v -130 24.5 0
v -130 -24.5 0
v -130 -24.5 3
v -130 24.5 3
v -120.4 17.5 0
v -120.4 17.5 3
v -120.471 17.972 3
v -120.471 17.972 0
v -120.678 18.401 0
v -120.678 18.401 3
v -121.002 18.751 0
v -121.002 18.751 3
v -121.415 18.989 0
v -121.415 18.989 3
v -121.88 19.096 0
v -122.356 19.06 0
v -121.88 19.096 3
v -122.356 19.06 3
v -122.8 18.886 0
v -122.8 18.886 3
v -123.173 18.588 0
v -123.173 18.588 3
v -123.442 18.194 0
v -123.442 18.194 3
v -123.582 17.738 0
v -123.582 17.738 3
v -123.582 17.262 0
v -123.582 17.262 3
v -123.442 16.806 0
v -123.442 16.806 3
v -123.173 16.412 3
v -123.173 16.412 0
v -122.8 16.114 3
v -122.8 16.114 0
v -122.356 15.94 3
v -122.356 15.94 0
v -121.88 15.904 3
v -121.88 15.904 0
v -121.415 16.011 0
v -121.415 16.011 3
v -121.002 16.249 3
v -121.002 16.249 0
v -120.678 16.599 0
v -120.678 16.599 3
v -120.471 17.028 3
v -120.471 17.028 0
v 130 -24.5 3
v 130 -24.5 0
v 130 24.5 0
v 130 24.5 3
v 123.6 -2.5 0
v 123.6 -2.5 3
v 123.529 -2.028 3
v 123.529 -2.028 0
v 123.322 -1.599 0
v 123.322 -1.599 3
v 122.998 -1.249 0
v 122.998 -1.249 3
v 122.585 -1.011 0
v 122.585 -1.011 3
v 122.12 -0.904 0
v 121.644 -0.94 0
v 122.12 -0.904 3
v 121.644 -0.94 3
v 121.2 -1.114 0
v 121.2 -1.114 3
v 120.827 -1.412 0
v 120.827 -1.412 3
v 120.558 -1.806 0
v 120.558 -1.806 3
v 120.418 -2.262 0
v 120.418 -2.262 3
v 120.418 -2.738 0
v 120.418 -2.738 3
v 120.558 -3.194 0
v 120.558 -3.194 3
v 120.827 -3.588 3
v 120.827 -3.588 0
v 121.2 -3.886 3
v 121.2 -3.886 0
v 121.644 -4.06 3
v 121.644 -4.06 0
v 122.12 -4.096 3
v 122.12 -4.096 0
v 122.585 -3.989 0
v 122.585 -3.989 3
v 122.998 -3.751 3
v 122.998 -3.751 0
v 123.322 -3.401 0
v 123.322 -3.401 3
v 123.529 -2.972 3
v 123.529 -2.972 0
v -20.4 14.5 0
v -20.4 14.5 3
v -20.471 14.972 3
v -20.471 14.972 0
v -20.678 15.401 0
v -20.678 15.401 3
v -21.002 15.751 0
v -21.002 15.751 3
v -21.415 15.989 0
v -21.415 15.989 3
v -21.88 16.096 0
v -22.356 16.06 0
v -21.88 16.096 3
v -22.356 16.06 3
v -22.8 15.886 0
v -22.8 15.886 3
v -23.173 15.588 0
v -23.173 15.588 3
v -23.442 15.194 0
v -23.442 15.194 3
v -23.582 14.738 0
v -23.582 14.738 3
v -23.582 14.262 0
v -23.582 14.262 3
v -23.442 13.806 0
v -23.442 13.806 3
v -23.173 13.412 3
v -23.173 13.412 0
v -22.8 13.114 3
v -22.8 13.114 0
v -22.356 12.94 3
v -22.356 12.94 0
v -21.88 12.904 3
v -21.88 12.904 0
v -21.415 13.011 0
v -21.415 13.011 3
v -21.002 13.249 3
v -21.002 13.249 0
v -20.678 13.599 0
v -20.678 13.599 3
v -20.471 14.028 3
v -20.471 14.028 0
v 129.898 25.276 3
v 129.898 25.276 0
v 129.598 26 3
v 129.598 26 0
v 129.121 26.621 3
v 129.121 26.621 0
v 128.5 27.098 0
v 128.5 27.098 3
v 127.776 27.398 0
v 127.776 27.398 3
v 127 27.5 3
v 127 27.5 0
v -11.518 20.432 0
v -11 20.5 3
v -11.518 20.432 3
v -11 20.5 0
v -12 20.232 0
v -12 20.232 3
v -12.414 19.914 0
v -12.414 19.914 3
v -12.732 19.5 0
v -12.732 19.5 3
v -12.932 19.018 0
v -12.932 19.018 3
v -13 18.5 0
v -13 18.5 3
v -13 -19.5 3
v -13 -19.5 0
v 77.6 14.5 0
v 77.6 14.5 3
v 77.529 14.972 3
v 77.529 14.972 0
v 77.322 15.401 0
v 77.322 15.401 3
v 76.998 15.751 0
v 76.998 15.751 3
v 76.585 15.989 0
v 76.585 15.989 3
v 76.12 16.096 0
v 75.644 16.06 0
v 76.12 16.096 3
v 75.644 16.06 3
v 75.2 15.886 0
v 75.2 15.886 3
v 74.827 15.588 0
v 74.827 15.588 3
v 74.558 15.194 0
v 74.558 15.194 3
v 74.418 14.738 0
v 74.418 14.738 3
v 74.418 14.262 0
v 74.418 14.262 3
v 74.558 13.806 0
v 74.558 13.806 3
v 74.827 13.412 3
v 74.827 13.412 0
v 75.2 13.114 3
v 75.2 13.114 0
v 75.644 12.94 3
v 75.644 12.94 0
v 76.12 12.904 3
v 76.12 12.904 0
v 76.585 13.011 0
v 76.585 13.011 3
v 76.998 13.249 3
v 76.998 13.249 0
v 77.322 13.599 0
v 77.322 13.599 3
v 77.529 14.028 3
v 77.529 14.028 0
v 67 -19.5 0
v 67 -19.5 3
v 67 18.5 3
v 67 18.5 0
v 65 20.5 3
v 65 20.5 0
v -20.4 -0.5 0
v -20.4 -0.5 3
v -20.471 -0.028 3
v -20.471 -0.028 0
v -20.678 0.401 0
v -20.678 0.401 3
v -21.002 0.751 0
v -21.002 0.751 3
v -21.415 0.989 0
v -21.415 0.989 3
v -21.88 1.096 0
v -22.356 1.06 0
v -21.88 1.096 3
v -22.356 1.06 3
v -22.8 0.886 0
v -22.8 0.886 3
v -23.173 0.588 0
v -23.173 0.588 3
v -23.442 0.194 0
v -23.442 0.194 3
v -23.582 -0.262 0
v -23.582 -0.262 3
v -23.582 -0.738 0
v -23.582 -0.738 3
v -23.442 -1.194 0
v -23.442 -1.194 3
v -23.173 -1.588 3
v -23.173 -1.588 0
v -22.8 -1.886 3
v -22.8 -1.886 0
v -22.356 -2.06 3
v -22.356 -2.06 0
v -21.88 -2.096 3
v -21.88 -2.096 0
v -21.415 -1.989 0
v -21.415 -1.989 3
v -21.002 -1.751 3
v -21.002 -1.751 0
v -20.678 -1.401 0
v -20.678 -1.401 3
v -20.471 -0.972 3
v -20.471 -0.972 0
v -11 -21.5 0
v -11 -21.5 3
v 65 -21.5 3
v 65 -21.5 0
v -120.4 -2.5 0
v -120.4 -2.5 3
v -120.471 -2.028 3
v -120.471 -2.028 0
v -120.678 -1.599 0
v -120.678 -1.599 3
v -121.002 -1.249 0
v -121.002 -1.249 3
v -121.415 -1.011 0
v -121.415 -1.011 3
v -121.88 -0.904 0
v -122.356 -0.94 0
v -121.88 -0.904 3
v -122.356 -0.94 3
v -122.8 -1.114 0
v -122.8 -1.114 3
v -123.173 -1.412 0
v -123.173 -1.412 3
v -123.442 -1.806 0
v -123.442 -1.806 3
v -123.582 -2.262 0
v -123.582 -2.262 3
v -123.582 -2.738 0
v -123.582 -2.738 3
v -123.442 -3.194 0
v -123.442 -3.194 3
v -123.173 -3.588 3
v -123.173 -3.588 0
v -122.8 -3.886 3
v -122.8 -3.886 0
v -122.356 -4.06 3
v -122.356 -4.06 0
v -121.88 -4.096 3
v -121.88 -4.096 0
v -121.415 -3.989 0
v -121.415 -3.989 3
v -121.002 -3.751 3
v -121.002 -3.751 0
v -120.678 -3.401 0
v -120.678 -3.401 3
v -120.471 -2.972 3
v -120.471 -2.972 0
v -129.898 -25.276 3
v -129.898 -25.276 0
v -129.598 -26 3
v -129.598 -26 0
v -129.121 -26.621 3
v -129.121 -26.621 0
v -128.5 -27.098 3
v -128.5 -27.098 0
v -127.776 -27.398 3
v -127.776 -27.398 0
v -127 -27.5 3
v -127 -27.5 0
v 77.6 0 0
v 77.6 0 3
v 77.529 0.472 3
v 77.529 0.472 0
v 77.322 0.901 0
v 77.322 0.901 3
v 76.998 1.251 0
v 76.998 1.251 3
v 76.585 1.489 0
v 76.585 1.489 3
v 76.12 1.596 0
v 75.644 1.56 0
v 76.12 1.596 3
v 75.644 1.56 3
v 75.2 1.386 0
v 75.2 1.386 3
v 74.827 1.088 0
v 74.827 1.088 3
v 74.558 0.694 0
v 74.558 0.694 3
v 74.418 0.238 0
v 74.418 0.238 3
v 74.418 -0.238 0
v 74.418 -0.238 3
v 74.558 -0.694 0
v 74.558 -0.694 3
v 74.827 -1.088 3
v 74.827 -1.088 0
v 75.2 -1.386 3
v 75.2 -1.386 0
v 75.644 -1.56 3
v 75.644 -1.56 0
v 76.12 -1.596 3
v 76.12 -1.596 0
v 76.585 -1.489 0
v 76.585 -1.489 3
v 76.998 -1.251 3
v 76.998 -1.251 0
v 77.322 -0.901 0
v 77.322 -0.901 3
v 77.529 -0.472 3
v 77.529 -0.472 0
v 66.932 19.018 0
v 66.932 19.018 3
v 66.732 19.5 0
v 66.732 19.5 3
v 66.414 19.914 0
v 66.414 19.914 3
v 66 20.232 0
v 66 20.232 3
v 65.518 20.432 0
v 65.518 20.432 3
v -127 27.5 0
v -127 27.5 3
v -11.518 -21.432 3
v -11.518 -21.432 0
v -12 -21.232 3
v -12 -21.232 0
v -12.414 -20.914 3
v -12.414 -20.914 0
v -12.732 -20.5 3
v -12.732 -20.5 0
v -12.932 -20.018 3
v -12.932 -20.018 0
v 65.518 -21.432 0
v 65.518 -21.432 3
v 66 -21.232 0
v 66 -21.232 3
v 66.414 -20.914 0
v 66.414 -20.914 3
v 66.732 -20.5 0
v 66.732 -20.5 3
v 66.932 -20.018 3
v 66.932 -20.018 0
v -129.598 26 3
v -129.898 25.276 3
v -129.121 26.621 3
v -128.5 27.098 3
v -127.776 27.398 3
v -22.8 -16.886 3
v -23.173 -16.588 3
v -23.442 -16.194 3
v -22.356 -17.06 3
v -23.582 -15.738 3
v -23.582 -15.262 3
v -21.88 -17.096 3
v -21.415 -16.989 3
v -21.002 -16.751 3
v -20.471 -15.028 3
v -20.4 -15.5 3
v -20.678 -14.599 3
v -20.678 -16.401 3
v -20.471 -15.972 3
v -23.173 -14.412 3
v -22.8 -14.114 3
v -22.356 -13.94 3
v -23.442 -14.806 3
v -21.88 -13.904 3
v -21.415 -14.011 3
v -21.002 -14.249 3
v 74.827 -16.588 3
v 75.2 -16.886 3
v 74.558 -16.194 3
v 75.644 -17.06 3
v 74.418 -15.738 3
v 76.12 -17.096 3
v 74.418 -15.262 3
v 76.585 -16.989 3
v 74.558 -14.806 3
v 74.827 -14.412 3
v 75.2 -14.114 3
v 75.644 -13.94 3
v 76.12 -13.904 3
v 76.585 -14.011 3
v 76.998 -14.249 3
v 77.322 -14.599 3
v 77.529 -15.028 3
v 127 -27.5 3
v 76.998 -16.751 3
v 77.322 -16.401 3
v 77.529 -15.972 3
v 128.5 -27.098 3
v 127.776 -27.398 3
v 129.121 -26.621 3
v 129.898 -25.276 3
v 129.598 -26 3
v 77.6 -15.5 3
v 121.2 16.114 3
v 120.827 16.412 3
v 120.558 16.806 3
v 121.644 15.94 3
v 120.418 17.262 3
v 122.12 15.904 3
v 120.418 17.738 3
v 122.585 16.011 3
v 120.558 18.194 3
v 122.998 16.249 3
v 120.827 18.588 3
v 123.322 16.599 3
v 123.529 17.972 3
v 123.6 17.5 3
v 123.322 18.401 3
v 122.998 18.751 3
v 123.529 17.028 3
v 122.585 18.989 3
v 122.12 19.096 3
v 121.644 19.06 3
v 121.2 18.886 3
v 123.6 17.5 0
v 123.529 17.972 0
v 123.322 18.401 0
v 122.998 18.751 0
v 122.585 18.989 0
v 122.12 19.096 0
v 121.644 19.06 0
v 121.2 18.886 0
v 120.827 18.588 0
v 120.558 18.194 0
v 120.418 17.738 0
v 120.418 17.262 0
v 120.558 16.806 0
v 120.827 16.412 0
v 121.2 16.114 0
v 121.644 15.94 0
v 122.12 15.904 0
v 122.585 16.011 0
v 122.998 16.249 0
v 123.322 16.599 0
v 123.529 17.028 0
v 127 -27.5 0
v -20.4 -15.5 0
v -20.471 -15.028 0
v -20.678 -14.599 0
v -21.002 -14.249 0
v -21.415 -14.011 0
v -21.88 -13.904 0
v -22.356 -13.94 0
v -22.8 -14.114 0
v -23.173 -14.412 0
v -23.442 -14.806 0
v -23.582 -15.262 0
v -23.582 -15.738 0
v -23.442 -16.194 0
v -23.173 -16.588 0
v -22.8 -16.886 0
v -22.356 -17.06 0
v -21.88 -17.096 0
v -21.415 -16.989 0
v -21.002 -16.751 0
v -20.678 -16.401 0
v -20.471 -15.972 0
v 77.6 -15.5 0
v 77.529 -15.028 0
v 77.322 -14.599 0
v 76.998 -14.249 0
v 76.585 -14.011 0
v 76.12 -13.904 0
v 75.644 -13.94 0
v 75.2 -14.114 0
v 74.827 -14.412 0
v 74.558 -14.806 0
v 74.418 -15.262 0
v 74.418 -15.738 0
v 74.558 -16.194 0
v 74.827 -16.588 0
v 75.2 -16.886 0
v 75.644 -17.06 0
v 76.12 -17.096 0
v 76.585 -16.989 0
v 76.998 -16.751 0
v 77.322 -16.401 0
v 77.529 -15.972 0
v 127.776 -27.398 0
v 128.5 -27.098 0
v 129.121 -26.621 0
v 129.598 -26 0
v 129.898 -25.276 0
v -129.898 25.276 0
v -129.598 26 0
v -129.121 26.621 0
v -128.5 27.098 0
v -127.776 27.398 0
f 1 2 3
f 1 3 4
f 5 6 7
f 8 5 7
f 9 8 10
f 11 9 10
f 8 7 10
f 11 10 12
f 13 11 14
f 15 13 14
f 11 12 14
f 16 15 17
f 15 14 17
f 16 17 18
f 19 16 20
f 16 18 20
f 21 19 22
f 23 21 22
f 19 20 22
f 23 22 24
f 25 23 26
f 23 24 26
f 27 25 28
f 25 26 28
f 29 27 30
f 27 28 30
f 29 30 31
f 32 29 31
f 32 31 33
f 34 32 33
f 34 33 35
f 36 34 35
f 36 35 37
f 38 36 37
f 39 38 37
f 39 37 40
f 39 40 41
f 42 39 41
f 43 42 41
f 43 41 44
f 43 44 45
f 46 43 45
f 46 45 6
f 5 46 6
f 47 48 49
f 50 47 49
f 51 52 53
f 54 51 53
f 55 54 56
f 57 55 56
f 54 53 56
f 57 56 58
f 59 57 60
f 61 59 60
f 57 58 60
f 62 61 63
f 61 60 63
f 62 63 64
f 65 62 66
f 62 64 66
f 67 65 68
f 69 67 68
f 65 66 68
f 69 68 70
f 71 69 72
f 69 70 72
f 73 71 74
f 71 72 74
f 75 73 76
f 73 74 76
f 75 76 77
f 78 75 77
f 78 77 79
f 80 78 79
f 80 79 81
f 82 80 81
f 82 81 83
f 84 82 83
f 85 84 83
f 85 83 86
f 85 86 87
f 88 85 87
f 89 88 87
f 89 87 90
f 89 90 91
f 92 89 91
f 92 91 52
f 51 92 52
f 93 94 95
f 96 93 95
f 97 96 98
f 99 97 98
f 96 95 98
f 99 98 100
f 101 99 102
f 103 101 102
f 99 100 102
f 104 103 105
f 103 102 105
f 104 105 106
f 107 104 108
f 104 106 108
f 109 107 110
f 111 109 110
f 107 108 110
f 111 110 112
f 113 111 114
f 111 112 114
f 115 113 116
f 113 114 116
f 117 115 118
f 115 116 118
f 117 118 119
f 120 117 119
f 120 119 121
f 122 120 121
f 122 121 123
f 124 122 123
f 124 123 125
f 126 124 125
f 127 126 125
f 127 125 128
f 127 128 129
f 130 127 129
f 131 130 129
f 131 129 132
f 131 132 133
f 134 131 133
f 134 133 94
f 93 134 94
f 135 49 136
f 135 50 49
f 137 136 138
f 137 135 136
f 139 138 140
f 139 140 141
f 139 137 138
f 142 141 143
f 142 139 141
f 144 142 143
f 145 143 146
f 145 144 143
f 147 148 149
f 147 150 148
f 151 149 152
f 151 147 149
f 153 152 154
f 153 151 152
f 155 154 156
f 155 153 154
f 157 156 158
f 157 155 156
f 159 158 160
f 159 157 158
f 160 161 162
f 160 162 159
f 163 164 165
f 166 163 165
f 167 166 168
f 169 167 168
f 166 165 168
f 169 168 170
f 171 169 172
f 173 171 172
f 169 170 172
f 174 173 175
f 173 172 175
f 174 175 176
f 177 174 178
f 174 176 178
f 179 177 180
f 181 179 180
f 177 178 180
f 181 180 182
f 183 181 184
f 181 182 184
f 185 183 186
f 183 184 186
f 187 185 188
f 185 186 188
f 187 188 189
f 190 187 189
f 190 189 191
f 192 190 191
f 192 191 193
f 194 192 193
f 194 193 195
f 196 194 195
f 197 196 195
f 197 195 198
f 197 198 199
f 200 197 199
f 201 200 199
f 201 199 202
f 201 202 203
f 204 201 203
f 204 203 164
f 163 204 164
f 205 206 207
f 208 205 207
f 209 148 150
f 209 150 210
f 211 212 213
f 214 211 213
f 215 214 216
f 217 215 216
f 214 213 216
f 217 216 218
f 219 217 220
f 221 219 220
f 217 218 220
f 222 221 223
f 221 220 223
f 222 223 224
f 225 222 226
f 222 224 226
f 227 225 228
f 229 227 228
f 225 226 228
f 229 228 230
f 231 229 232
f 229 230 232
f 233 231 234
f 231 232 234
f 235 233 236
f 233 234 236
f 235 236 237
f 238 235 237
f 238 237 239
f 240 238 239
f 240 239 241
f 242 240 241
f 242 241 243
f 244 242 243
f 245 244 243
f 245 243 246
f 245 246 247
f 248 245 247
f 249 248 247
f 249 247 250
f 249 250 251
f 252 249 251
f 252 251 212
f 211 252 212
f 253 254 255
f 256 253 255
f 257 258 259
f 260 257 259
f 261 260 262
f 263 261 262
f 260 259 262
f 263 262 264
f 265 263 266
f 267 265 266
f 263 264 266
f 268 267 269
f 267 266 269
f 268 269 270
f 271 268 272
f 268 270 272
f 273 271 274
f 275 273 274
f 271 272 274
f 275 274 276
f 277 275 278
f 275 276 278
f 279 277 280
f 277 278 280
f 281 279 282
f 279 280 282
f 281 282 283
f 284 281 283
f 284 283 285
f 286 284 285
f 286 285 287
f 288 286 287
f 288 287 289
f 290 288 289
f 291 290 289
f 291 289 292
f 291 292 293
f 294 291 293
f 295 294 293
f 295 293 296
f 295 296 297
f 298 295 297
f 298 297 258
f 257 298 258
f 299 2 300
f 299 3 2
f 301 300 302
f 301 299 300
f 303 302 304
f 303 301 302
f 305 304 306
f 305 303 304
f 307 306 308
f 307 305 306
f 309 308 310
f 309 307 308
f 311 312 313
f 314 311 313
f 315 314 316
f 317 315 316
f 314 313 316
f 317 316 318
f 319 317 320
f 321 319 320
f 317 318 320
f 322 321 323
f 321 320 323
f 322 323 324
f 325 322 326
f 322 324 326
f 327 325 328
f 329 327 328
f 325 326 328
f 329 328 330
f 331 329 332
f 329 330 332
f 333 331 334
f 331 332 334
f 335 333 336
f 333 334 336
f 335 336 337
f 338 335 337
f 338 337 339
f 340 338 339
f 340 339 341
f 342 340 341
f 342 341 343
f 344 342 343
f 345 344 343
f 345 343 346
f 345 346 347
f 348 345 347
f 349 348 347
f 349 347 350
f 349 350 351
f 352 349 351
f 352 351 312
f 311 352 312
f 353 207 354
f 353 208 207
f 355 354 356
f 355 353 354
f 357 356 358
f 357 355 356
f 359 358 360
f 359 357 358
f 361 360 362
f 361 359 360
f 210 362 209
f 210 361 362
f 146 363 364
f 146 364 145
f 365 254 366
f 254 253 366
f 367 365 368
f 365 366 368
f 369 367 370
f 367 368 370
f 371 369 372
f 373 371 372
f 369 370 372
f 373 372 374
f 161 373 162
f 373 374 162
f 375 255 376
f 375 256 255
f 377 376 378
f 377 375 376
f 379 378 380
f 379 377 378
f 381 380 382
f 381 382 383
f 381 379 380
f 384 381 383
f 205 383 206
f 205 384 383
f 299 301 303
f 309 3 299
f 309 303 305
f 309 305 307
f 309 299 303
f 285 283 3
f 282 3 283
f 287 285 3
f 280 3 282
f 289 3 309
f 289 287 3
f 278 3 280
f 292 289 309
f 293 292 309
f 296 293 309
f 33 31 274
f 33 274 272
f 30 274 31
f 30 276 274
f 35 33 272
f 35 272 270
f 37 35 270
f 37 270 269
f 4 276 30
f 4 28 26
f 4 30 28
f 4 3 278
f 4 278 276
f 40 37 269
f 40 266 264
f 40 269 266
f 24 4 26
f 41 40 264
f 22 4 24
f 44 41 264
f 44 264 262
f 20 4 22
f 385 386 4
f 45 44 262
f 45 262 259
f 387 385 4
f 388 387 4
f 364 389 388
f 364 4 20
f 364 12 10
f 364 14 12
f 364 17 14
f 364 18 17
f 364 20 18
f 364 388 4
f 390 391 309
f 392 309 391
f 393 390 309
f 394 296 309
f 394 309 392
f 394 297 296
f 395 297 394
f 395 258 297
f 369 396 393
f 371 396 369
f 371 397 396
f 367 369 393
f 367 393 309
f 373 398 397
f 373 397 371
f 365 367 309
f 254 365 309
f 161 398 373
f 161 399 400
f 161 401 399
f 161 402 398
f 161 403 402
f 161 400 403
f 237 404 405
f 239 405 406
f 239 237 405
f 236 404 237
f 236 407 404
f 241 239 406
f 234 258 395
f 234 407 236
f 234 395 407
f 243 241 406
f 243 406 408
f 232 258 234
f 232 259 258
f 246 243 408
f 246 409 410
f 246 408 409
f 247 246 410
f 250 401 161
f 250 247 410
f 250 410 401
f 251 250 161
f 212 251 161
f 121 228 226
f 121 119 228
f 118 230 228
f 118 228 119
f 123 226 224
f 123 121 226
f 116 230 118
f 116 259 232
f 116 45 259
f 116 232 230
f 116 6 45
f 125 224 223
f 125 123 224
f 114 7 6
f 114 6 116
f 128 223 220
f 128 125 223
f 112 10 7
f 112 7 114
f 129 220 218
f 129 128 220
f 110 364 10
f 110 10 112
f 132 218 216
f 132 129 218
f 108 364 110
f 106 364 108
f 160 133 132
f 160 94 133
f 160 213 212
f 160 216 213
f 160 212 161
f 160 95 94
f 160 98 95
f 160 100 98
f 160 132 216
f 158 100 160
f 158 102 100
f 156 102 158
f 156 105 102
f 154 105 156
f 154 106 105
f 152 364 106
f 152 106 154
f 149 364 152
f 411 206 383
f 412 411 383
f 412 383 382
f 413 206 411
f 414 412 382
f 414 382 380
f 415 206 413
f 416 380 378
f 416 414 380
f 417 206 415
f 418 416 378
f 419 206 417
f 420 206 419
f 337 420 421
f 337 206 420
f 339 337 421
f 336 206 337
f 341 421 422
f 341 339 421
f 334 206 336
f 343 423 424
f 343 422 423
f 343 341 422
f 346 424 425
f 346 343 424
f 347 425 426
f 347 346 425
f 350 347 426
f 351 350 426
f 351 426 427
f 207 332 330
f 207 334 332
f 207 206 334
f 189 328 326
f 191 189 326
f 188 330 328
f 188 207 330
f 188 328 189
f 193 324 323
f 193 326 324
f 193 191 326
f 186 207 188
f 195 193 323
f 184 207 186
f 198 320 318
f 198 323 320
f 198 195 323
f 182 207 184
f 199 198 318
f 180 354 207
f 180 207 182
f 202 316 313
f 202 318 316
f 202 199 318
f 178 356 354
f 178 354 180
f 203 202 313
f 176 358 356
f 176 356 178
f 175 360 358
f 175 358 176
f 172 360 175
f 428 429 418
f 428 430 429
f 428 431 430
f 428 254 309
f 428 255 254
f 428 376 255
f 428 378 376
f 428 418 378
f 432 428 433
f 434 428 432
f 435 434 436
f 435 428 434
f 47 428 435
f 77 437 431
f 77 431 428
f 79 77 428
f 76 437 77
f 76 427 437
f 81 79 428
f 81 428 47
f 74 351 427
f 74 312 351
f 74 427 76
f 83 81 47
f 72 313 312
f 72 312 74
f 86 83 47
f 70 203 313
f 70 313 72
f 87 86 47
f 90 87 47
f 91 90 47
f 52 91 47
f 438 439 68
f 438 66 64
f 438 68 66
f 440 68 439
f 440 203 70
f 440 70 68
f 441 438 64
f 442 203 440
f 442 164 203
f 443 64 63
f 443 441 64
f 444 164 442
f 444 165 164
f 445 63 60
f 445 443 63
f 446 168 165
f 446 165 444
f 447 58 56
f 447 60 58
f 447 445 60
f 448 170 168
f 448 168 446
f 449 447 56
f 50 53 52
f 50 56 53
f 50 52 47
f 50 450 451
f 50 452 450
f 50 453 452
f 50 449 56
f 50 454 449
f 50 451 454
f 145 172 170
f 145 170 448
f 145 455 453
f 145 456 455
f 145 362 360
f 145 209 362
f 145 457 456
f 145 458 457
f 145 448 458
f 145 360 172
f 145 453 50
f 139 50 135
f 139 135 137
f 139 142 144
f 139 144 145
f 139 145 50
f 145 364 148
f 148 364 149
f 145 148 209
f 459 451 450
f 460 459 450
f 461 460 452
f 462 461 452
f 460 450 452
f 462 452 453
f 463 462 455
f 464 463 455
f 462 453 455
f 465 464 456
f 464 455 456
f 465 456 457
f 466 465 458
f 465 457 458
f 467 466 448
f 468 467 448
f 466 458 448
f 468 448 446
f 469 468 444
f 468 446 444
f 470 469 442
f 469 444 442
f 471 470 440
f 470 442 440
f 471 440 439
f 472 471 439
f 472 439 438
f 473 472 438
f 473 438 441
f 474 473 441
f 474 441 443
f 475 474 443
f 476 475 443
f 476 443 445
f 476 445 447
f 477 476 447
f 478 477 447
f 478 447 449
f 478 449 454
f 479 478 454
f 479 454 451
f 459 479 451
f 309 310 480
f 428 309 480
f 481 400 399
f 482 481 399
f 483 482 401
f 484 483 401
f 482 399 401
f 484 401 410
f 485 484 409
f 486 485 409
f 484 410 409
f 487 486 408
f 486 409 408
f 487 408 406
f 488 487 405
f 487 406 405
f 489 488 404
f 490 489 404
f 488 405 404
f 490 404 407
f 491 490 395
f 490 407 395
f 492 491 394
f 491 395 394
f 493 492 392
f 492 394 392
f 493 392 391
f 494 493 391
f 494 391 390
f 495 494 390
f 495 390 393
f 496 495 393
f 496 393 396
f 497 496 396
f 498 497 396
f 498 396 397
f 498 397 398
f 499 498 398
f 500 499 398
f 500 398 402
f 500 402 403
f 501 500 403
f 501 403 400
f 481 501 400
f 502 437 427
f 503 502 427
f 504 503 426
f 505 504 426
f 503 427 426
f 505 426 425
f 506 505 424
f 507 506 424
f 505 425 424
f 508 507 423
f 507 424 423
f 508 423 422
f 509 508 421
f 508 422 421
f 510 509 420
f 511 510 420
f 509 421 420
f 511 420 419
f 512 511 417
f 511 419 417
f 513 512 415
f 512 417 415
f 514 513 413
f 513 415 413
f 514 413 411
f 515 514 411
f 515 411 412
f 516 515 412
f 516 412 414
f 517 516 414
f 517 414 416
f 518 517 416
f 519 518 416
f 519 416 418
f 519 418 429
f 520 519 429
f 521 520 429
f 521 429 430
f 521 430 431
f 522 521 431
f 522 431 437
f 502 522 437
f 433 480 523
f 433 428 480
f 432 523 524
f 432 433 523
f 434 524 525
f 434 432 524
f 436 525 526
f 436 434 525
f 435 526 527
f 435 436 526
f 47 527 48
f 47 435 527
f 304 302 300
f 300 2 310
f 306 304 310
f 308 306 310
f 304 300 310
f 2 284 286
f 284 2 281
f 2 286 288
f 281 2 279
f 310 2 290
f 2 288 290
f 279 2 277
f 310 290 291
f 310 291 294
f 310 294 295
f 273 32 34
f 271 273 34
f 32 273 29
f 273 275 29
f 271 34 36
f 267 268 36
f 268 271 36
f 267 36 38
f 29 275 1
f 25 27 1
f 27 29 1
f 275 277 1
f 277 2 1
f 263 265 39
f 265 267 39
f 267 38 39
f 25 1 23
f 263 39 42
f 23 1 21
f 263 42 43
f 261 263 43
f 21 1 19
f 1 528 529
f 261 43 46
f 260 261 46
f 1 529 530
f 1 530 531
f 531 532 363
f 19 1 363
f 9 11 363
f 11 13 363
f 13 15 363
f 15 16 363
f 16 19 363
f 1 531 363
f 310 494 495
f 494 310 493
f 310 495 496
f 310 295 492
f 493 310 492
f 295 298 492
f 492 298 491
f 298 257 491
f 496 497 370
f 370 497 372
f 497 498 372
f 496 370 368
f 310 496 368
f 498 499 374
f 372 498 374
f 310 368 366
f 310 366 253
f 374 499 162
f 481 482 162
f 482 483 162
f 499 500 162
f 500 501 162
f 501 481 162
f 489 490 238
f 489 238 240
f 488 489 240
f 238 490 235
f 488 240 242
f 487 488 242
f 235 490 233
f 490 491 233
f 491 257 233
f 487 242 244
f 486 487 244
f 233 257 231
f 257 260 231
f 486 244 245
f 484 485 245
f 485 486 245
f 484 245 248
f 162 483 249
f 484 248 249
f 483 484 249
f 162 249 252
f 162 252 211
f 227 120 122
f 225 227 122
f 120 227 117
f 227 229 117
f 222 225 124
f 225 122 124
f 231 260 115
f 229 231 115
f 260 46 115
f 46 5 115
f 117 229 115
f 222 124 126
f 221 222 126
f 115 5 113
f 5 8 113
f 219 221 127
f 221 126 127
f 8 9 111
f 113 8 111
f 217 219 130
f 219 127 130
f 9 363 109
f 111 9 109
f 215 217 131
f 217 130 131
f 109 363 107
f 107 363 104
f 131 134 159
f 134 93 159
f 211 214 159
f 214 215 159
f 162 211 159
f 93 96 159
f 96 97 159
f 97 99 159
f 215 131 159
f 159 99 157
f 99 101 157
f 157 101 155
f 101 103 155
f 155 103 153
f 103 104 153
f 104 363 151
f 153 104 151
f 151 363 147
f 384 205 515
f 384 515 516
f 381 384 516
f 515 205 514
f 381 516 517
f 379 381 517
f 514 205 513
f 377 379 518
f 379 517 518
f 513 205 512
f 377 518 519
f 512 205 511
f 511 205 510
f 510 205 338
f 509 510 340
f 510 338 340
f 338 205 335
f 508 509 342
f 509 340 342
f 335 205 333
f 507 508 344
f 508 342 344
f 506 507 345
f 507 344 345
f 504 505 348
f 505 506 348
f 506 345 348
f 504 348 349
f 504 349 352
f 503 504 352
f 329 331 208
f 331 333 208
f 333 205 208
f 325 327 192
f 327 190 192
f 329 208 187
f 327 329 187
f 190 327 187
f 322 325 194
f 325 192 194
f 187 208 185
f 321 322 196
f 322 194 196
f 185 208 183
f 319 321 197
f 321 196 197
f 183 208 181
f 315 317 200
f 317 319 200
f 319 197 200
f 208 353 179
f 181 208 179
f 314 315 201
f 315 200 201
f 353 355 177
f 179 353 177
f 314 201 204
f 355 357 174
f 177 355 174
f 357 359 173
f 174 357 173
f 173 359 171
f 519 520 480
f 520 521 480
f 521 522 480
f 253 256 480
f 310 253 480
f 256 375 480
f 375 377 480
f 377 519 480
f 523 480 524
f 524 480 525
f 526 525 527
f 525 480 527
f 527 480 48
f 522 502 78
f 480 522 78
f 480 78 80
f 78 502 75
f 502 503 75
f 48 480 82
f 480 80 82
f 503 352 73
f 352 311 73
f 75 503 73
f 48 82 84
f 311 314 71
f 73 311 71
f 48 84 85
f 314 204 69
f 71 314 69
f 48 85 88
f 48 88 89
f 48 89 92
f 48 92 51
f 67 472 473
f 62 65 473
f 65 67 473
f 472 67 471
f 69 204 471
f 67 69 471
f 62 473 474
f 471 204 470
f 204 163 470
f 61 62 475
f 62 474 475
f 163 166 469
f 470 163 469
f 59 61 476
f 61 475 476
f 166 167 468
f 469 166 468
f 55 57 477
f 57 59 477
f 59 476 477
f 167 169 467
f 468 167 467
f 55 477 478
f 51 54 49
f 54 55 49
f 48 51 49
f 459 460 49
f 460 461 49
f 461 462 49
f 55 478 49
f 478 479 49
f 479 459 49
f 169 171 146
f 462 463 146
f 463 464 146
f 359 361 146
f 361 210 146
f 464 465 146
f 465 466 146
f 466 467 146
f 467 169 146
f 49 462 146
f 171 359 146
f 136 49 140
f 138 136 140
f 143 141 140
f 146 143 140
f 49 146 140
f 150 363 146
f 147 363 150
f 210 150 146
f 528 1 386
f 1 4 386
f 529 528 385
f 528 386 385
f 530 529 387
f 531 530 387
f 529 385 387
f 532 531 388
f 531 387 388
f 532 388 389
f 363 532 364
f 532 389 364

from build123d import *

# Parameters (mm, degrees)
SKETCH_1_W          = 260
SKETCH_1_H          = 55
EXTRUDE_1_DEPTH     = 3
FILLET_1_R          = 3
SKETCH_2_R          = 1.6
CUT_EXTRUDE_1_DEPTH = 48
SKETCH_3_R          = 1.6
SKETCH_3_W          = 80
SKETCH_3_H          = 42
CUT_EXTRUDE_2_DEPTH = 327
FILLET_2_R          = 2


with BuildPart() as part:
    # 草图1 → 凸台-拉伸1 (new body)
    with BuildSketch(Plane.XY):
        Rectangle(SKETCH_1_W, SKETCH_1_H)
    extrude(amount=EXTRUDE_1_DEPTH)

    # 圆角1
    fillet_1_edges = [part.edges().sort_by_distance(p)[0] for p in [
        (-130, 27.5, 1.5),
        (130, 27.5, 1.5),
        (130, -27.5, 1.5),
        (-130, -27.5, 1.5),
    ]]
    fillet(fillet_1_edges, radius=FILLET_1_R)

    # 草图2 → 切除-拉伸1 (cut)
    with BuildSketch(Plane.XY.offset(3)):
        with Locations((-122, 17.5)):
            Circle(SKETCH_2_R)
        with Locations((-122, -2.5)):
            Circle(SKETCH_2_R)
        with Locations((122, -2.5)):
            Circle(SKETCH_2_R)
        with Locations((122, 17.5)):
            Circle(SKETCH_2_R)
    extrude(amount=-CUT_EXTRUDE_1_DEPTH, mode=Mode.SUBTRACT)

    # 草图3 → 切除-拉伸2 (cut)
    with BuildSketch(Plane.XY.offset(3)):
        with Locations((-22, 14.5)):
            Circle(SKETCH_3_R)
        with Locations((-22, -0.5)):
            Circle(SKETCH_3_R)
        with Locations((-22, -15.5)):
            Circle(SKETCH_3_R)
        with Locations((76, 14.5)):
            Circle(SKETCH_3_R)
        with Locations((76, 0)):
            Circle(SKETCH_3_R)
        with Locations((76, -15.5)):
            Circle(SKETCH_3_R)
        with Locations((27, -0.5)):
            Rectangle(SKETCH_3_W, SKETCH_3_H)
    extrude(amount=-CUT_EXTRUDE_2_DEPTH, mode=Mode.SUBTRACT)

    # 圆角2
    fillet_2_edges = [part.edges().sort_by_distance(p)[0] for p in [
        (-13, -21.5, 1.5),
        (-13, 20.5, 1.5),
        (67, 20.5, 1.5),
        (67, -21.5, 1.5),
    ]]
    fillet(fillet_2_edges, radius=FILLET_2_R)


solid = part.part
